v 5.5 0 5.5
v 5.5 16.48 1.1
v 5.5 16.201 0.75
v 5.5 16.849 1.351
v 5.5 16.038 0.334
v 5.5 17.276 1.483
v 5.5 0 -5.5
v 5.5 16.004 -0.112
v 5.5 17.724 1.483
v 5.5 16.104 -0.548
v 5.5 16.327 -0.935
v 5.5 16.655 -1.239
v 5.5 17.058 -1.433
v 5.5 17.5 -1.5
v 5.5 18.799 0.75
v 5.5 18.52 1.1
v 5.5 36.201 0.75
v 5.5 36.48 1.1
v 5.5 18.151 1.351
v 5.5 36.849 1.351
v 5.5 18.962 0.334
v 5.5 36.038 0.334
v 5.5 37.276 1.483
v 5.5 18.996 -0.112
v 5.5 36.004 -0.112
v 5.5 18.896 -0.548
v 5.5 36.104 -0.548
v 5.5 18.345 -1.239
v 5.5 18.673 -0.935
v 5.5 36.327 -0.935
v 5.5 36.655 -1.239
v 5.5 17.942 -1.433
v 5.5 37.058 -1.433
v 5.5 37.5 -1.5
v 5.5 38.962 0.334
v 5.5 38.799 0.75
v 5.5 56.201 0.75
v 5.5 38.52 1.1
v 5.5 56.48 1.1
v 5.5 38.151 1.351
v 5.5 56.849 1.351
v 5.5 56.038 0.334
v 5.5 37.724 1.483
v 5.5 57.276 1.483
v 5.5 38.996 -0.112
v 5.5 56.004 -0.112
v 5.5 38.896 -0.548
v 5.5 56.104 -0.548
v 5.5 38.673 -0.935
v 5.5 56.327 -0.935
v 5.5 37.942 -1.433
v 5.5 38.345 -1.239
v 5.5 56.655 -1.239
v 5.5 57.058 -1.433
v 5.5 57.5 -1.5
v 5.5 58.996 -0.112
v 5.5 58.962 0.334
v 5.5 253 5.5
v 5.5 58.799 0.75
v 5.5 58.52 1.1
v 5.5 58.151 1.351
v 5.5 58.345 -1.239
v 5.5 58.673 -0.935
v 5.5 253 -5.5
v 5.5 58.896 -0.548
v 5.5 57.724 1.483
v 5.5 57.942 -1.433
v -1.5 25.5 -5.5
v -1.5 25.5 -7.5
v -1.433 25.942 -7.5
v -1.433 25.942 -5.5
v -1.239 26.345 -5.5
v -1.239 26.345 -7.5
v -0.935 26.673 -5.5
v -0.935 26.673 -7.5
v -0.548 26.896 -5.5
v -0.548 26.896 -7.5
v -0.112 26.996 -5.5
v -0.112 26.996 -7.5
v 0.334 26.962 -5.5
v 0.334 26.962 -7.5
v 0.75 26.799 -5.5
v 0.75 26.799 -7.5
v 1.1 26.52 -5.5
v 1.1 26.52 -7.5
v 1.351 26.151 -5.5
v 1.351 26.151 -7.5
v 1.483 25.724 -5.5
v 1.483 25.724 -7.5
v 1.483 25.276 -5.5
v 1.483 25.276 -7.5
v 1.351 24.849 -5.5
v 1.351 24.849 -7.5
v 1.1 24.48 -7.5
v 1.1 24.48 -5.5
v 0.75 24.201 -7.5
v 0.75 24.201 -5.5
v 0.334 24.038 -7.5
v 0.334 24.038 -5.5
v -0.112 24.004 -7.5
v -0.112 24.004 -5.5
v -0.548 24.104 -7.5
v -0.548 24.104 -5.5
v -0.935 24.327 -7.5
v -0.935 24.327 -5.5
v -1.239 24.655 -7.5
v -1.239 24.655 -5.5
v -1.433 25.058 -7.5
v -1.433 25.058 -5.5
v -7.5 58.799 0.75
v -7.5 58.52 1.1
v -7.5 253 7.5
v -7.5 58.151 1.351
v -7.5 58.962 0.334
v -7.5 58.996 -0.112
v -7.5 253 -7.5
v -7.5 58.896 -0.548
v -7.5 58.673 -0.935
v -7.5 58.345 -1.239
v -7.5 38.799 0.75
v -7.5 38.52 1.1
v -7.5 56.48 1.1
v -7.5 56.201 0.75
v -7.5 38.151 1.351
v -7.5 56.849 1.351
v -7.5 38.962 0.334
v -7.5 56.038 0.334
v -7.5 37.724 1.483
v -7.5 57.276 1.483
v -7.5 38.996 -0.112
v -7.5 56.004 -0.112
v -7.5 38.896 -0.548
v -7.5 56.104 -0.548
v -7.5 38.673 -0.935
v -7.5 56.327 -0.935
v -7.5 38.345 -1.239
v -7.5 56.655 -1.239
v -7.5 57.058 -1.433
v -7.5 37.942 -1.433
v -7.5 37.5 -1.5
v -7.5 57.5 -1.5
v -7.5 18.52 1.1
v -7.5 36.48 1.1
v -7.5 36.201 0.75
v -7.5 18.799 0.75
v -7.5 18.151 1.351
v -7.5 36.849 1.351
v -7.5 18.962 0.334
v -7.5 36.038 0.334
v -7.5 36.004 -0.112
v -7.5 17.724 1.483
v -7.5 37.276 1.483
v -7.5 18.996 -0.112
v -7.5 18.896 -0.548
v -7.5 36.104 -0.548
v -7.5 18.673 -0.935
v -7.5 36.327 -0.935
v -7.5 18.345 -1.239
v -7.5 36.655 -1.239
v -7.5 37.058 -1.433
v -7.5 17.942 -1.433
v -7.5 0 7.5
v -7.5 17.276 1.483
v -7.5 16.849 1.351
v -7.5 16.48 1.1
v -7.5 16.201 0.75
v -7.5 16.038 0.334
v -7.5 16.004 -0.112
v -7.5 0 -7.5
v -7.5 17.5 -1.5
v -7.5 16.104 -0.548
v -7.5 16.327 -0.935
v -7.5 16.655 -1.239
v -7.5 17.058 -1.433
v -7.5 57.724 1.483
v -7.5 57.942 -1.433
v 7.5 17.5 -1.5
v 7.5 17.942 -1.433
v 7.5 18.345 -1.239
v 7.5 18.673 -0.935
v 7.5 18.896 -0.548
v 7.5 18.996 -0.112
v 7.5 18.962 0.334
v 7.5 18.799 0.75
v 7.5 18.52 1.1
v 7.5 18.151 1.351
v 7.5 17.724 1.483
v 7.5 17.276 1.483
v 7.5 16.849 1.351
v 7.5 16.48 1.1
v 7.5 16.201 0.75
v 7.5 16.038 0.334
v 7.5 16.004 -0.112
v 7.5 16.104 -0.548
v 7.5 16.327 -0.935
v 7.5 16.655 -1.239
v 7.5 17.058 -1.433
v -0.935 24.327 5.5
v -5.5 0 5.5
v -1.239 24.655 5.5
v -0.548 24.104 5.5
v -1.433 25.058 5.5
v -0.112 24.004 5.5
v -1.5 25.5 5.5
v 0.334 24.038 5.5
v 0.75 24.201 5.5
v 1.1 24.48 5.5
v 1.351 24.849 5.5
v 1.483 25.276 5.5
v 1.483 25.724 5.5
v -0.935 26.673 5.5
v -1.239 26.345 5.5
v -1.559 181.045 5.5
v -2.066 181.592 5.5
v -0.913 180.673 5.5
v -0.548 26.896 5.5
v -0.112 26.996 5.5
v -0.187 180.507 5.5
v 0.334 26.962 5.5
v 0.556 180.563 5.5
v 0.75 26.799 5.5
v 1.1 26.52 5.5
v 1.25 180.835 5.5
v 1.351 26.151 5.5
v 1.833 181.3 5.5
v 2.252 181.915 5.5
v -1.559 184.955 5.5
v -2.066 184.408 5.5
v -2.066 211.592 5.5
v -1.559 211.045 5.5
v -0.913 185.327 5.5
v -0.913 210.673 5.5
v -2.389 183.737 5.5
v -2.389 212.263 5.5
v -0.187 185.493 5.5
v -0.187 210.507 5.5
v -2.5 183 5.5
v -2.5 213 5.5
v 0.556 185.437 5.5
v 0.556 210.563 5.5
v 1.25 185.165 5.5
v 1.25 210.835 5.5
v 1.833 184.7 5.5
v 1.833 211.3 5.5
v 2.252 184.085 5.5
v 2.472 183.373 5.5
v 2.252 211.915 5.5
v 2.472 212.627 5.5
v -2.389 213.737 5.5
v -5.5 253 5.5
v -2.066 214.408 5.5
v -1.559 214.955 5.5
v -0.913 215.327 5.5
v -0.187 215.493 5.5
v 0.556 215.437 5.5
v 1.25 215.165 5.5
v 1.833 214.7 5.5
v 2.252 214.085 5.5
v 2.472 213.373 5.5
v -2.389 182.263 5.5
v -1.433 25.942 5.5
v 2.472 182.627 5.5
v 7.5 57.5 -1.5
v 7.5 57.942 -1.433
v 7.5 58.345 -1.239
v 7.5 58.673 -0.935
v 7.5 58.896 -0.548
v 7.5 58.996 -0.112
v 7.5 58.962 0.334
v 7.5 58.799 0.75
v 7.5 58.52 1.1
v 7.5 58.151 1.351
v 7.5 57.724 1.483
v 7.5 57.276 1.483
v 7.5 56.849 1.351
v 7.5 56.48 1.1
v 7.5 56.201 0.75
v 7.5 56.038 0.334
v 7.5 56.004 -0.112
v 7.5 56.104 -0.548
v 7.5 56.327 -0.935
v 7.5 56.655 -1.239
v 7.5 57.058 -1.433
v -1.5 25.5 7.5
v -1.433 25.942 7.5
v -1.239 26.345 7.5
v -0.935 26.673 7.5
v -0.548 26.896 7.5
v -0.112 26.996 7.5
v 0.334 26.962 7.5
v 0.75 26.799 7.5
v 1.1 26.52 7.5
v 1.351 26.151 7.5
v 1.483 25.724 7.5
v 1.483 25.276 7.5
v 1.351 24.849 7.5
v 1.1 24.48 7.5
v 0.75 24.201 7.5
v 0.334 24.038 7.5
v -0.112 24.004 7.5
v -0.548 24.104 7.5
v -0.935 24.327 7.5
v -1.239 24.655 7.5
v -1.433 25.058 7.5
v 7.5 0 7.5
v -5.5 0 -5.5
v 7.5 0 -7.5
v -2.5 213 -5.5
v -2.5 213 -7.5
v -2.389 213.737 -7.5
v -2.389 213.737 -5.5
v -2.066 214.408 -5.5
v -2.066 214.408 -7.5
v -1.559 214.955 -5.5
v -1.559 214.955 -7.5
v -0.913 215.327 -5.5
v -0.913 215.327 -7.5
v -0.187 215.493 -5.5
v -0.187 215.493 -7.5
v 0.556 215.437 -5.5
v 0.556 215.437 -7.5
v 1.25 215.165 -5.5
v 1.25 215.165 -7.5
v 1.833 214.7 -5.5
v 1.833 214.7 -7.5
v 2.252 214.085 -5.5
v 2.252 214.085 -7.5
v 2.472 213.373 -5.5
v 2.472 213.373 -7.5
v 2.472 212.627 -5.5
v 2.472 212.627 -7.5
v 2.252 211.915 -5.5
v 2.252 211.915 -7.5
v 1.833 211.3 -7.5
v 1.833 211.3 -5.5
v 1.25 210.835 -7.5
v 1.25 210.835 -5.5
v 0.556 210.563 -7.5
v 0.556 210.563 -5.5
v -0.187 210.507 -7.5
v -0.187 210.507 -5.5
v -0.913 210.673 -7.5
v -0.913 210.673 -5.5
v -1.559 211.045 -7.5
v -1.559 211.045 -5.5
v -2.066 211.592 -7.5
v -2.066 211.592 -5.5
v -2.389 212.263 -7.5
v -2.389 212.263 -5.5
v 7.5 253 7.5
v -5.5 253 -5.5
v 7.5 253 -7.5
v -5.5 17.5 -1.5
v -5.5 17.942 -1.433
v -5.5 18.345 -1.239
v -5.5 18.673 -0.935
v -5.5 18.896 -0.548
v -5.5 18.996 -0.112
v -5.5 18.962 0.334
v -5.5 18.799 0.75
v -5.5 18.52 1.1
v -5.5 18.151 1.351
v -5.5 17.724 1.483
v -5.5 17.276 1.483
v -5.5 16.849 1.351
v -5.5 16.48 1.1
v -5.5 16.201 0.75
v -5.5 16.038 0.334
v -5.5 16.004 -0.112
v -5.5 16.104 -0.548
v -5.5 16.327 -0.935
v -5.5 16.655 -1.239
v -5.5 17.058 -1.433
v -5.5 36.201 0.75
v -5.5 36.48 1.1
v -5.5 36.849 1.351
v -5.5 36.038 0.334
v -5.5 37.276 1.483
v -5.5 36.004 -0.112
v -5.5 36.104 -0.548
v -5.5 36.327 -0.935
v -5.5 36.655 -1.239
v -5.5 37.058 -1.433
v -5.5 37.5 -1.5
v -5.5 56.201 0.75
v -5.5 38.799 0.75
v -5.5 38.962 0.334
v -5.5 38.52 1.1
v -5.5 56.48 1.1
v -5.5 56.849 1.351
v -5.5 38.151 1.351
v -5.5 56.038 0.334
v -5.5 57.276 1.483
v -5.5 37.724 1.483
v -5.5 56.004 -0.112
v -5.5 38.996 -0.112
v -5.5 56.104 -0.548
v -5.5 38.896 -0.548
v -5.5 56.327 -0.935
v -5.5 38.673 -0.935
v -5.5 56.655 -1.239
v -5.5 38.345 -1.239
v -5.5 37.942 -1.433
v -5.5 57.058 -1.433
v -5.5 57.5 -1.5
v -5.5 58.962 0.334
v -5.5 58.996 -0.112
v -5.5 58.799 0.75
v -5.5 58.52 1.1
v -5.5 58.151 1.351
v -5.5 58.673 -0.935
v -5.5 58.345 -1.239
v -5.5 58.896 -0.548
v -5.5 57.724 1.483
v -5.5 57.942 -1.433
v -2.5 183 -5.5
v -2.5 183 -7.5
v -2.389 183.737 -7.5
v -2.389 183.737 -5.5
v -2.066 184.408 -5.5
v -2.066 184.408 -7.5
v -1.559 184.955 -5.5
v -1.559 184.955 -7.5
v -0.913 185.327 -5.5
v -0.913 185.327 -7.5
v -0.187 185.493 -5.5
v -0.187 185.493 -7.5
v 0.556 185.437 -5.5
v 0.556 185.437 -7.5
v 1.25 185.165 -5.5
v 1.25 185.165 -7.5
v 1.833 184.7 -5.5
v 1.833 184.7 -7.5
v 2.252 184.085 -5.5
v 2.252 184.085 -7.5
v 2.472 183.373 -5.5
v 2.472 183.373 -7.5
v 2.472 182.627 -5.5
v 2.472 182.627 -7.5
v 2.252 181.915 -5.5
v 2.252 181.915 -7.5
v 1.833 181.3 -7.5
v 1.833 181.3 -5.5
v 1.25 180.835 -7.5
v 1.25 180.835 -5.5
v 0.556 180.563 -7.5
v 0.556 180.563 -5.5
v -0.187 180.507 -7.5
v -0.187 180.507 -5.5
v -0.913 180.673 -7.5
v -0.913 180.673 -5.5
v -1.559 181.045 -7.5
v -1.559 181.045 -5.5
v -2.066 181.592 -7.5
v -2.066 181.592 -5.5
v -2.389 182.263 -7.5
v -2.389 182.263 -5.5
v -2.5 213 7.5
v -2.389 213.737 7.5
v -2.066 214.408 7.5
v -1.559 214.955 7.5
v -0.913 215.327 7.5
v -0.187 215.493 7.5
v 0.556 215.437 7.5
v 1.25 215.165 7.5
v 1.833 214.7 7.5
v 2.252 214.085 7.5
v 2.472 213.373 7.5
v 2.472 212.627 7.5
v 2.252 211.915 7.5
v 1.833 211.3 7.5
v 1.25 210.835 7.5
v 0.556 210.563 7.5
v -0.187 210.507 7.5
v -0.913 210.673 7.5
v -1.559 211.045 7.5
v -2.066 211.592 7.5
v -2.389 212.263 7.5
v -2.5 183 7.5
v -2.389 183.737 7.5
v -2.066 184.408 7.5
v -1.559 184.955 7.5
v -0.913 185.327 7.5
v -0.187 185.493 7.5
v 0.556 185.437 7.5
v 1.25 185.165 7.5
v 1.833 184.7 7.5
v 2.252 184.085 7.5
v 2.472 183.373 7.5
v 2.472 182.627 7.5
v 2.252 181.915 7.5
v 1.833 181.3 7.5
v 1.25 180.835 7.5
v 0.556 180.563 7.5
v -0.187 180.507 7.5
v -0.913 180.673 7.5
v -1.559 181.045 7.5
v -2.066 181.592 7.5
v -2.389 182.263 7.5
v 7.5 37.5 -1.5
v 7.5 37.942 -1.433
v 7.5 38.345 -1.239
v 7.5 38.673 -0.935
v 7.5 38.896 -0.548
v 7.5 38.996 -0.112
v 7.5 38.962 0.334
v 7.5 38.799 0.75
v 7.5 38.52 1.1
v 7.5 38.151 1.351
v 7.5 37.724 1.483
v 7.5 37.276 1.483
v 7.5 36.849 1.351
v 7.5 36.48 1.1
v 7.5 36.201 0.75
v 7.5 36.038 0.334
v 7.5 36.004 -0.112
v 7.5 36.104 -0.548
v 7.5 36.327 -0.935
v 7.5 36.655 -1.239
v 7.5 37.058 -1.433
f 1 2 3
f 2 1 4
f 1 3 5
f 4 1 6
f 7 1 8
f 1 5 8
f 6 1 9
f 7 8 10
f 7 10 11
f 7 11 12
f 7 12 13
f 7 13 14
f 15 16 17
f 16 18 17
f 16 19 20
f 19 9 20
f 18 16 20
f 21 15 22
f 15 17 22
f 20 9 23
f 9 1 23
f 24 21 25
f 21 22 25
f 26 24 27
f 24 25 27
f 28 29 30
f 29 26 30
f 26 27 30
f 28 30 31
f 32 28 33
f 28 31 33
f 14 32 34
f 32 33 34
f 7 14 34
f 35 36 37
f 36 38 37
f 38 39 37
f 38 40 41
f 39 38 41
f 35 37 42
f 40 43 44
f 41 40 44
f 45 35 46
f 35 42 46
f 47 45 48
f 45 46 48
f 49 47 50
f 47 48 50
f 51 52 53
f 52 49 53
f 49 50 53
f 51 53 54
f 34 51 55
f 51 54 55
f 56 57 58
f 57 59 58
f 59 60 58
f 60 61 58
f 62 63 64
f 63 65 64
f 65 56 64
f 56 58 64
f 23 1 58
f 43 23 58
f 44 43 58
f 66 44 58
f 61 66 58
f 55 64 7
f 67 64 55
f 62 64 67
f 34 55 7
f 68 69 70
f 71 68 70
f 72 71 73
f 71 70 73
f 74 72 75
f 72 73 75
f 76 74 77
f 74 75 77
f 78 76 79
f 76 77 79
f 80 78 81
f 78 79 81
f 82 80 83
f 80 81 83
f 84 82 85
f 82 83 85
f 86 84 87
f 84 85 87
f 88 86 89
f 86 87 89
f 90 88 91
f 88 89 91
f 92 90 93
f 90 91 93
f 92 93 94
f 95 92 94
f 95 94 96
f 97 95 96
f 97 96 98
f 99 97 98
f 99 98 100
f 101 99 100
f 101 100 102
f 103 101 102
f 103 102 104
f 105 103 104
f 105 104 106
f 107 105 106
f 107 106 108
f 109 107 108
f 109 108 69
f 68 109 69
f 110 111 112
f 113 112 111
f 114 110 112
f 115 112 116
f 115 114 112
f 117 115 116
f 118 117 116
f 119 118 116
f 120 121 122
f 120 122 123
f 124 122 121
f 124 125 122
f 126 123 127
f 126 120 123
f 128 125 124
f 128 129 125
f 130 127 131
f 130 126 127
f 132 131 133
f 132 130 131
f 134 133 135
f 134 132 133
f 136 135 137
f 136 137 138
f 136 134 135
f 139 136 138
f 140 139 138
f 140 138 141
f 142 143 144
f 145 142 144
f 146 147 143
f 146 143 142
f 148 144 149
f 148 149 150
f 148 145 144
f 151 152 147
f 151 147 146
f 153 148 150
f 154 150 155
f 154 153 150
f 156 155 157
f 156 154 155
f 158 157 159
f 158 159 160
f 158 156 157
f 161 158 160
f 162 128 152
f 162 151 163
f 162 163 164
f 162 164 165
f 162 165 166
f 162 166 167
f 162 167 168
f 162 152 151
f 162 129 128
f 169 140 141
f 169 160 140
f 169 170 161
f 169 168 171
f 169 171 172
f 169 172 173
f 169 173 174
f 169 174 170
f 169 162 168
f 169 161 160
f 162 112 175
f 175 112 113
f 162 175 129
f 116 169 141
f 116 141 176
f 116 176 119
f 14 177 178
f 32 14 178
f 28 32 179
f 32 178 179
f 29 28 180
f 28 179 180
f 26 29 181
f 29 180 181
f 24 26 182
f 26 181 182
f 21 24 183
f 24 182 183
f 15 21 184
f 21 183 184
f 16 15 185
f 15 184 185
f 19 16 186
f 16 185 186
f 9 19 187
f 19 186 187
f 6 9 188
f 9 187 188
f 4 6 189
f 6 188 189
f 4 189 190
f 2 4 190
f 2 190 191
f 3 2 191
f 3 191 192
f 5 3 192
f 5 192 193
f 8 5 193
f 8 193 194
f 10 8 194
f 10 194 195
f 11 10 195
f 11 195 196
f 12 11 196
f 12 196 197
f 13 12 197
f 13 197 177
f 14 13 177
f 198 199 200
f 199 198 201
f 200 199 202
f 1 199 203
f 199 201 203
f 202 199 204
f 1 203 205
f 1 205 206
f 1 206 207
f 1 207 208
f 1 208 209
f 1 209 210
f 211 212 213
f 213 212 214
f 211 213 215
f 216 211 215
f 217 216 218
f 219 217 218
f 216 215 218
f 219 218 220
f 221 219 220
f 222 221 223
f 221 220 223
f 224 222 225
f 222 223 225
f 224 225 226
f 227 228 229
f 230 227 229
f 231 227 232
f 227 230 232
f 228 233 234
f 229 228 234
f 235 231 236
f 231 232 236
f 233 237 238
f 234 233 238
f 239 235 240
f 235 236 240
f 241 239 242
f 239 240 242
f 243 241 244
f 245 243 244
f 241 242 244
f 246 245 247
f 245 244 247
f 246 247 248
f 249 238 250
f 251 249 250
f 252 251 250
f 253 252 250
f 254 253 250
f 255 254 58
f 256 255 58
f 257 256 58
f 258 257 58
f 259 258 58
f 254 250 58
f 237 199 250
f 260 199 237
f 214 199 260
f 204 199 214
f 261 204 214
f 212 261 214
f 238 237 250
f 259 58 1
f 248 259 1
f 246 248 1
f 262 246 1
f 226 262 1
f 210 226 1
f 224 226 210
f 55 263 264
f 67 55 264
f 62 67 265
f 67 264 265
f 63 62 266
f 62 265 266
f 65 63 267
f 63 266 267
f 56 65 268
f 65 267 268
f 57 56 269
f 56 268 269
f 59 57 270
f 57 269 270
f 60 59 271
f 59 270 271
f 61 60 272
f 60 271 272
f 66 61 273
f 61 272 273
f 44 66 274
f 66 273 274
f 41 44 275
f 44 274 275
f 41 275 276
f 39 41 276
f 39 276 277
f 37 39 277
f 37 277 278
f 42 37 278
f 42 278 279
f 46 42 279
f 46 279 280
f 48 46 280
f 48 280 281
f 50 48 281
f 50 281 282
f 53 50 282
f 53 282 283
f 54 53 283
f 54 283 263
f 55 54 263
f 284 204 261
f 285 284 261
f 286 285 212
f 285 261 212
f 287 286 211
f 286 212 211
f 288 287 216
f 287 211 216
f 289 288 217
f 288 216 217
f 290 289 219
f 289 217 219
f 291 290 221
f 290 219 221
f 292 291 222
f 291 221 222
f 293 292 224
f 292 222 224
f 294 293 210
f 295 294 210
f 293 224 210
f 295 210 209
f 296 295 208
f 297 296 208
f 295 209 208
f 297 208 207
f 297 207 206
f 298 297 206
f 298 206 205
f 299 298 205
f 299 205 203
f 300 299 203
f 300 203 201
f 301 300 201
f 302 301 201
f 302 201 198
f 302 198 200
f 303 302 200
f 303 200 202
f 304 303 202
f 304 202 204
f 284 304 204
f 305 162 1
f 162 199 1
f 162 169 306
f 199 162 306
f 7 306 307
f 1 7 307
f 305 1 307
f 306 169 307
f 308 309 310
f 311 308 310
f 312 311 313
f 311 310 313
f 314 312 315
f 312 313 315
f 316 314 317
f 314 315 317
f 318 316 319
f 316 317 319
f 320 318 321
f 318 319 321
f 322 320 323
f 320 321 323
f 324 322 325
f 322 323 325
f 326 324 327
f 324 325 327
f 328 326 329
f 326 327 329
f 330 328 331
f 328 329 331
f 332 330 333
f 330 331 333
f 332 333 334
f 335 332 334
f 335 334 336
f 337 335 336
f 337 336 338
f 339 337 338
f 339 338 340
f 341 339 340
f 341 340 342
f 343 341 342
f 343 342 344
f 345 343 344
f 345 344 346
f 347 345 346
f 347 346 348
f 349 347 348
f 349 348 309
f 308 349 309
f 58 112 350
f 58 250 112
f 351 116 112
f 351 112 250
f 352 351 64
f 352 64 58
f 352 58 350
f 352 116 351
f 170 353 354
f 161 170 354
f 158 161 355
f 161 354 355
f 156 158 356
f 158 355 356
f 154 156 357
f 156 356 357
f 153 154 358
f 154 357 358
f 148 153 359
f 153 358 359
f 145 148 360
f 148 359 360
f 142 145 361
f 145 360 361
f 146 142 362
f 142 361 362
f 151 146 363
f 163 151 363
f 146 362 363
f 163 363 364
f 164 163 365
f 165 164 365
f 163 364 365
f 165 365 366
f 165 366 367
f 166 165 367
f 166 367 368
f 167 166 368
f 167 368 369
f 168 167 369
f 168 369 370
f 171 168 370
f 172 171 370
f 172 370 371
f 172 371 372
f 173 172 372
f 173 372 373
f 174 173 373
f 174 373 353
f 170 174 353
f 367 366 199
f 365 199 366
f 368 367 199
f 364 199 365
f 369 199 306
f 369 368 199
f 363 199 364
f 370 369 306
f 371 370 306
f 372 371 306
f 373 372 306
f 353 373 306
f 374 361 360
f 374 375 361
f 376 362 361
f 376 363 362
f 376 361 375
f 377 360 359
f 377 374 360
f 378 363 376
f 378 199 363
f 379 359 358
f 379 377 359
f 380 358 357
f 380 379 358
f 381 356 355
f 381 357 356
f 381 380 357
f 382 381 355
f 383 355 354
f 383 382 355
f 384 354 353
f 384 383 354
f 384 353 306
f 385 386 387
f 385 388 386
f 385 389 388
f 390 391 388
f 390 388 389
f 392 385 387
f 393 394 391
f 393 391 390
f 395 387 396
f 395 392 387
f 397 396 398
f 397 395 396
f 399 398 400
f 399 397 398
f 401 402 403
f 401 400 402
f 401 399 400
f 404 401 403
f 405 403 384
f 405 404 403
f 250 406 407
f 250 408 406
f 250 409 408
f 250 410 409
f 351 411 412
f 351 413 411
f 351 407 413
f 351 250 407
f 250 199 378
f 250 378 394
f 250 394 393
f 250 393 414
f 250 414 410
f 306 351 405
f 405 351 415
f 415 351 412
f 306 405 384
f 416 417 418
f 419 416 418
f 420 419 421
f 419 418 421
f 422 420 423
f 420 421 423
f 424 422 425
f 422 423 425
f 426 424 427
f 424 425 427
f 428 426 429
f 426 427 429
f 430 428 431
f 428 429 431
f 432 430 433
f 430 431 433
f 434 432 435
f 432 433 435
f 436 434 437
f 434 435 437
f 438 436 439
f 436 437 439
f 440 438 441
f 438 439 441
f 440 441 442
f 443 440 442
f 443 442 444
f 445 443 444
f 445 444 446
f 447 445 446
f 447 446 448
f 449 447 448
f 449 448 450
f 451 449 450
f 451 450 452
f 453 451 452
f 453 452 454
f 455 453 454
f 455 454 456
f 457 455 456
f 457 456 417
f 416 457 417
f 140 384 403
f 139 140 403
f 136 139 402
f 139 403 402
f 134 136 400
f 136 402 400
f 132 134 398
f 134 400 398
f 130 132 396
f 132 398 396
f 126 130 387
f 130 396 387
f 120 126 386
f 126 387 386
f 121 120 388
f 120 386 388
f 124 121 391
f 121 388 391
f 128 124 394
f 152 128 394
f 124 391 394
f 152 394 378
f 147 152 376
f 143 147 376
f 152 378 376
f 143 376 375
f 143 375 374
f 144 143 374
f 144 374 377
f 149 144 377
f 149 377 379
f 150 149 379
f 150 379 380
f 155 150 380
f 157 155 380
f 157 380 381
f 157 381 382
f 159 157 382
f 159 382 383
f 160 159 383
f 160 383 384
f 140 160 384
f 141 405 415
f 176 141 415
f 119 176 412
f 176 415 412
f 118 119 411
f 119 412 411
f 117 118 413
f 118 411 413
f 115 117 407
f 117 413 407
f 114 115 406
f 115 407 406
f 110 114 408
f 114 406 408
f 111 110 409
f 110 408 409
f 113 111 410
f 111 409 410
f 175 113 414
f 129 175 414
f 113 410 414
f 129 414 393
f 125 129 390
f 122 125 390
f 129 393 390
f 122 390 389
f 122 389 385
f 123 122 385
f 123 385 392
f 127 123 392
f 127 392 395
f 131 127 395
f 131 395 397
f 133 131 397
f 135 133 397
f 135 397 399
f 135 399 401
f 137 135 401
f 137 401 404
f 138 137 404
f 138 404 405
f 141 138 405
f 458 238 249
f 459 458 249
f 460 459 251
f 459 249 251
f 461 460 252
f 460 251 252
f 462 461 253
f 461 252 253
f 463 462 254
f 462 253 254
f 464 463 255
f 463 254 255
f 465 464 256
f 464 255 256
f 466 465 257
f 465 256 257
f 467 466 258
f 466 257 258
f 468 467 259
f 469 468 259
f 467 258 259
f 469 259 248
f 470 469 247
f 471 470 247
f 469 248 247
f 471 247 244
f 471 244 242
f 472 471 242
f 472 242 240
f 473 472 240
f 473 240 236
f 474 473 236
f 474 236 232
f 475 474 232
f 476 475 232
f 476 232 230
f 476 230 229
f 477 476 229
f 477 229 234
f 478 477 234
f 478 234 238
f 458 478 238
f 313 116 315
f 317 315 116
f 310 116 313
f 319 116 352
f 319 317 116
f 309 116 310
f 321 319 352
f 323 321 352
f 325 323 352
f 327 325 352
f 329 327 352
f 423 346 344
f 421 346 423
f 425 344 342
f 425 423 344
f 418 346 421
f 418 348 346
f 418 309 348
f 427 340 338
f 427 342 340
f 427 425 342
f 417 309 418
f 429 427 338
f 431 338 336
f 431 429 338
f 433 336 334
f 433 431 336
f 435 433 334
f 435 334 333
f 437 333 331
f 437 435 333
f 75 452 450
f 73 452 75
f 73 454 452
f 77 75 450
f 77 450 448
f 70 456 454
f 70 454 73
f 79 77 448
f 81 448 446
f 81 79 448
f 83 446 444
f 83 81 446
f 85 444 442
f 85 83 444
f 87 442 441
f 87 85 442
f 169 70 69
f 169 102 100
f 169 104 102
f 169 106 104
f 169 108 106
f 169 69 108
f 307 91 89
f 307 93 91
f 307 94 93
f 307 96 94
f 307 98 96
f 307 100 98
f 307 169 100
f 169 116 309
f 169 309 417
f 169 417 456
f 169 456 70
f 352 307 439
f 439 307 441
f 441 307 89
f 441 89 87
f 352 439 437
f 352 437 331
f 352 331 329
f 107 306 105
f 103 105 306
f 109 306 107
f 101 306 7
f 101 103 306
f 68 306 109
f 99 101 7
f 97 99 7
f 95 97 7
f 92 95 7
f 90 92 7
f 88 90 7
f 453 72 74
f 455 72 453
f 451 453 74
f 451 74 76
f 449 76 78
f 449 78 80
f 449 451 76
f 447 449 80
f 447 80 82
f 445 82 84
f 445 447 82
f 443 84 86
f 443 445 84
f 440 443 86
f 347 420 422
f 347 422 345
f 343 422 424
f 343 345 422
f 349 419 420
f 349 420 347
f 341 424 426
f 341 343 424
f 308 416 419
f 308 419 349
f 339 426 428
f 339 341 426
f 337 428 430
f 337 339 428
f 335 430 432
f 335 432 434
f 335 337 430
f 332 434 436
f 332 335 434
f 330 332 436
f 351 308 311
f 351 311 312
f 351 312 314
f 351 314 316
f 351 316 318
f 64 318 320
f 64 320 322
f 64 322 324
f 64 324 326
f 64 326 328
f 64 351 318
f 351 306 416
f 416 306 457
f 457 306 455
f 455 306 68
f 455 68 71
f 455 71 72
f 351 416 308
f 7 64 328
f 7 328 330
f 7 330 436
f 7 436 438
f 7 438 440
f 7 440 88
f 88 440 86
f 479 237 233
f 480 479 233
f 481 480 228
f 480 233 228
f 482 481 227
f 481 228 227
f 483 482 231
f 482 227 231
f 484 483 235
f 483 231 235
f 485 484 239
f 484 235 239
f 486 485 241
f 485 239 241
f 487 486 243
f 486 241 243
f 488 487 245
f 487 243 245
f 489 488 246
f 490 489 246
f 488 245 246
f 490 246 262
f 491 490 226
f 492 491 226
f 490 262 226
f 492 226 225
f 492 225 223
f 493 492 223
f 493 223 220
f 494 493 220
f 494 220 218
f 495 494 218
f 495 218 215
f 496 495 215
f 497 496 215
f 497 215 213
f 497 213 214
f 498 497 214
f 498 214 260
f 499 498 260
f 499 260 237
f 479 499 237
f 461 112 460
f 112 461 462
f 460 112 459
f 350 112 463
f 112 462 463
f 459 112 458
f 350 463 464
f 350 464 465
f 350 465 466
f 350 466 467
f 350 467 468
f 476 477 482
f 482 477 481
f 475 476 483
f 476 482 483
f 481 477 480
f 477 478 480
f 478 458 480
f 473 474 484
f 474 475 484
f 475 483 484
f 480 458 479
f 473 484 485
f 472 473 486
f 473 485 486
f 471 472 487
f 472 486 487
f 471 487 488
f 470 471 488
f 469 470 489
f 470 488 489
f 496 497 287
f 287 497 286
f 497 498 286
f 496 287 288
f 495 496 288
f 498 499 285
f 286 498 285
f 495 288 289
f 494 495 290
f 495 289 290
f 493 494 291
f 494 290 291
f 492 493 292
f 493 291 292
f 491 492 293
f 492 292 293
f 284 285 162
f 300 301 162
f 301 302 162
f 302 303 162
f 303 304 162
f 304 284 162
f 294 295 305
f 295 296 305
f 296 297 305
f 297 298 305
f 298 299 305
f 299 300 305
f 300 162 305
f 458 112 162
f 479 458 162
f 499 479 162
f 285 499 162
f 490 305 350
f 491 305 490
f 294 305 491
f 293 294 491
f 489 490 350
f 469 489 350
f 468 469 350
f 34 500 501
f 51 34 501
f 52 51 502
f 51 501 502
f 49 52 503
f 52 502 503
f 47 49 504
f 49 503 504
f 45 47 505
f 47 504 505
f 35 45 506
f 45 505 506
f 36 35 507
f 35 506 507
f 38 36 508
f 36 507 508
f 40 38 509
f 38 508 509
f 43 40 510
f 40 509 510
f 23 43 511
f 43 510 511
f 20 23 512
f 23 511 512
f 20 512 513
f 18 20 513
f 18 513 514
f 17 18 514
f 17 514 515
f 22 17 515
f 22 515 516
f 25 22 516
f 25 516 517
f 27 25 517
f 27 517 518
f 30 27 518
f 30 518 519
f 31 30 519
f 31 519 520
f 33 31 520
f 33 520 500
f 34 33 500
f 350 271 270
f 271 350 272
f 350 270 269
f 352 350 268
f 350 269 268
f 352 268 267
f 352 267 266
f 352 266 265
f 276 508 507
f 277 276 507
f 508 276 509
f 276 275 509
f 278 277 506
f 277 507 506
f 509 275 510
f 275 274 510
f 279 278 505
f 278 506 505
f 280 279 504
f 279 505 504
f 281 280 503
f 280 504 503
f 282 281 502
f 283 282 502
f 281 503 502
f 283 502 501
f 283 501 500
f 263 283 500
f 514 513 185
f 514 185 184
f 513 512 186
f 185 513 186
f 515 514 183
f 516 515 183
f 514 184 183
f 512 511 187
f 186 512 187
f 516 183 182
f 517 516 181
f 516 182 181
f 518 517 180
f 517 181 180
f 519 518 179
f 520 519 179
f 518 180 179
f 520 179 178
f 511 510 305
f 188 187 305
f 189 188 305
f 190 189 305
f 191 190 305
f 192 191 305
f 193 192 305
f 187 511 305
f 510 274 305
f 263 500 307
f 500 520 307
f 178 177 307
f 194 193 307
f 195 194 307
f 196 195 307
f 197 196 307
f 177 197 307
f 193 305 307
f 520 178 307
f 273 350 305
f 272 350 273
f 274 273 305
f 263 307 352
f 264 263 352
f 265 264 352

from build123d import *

# Parameters (mm, degrees)
SKETCH_1_W          = 15
SKETCH_1_H          = 15
EXTRUDE_1_DEPTH     = 253
SKETCH_2_W          = 11
SKETCH_2_H          = 11
CUT_EXTRUDE_1_DEPTH = 253
SKETCH_3_R          = 1.5
CUT_EXTRUDE_2_DEPTH = 15
SKETCH_4_R          = 1.5
CUT_EXTRUDE_3_DEPTH = 15
SKETCH_5_R          = 2.5
CUT_EXTRUDE_4_DEPTH = 15


with BuildPart() as part:
    # 草图1 → 凸台-拉伸1 (new body)
    with BuildSketch(Plane(origin=(0, 0, 0), x_dir=(1, 0, 0), z_dir=(0, 1, 0))):
        Rectangle(SKETCH_1_W, SKETCH_1_H)
    extrude(amount=EXTRUDE_1_DEPTH)

    # 草图2 → 切除-拉伸1 (cut)
    with BuildSketch(Plane(origin=(0, 253, 0), x_dir=(1, 0, 0), z_dir=(0, 1, 0))):
        Rectangle(SKETCH_2_W, SKETCH_2_H)
    extrude(amount=-CUT_EXTRUDE_1_DEPTH, mode=Mode.SUBTRACT)

    # 草图3 → 切除-拉伸2 (cut)
    with BuildSketch(Plane(origin=(7.5, 0, 0), x_dir=(0, 0, -1), z_dir=(1, 0, 0))):
        with Locations((0, 17.5)):
            Circle(SKETCH_3_R)
        with Locations((0, 37.5)):
            Circle(SKETCH_3_R)
        with Locations((0, 57.5)):
            Circle(SKETCH_3_R)
    extrude(amount=-CUT_EXTRUDE_2_DEPTH, mode=Mode.SUBTRACT)

    # 草图4 → 切除-拉伸3 (cut)
    with BuildSketch(Plane(origin=(0, 0, -7.5), x_dir=(-1, 0, 0), z_dir=(0, 0, -1))):
        with Locations((0, 25.5)):
            Circle(SKETCH_4_R)
    extrude(amount=-CUT_EXTRUDE_3_DEPTH, mode=Mode.SUBTRACT)

    # 草图5 → 切除-拉伸4 (cut)
    with BuildSketch(Plane(origin=(0, 0, -7.5), x_dir=(-1, 0, 0), z_dir=(0, 0, -1))):
        with Locations((0, 213)):
            Circle(SKETCH_5_R)
        with Locations((0, 183)):
            Circle(SKETCH_5_R)
    extrude(amount=-CUT_EXTRUDE_4_DEPTH, mode=Mode.SUBTRACT)


solid = part.part
